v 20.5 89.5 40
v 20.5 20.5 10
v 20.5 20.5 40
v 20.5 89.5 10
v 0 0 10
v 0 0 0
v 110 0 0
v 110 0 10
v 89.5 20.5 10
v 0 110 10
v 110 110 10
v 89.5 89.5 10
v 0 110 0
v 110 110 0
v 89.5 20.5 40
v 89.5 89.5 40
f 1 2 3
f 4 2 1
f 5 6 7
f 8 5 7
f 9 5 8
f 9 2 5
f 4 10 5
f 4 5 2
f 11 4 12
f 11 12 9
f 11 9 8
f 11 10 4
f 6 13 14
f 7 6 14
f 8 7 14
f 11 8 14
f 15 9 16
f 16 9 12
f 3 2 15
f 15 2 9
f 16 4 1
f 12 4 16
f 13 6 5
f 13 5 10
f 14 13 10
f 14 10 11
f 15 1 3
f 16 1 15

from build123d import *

# Parameters (mm, degrees)
F0_W     = 110
F0_H     = 110
F0_W_2   = 69
F0_H_2   = 69
F1_DEPTH = 10
F2_DEPTH = 40


with BuildPart() as f1:
    # F0 (on Top) → F1 (new body)
    with BuildSketch(Plane.XY):
        with Locations((55, 55)):
            Rectangle(F0_W, F0_H)
        with Locations((55, 55)):
            Rectangle(F0_W_2, F0_H_2, mode=Mode.SUBTRACT)
    extrude(amount=F1_DEPTH)

    # F0 (on Top) → F2 (join)
    with BuildSketch(Plane.XY):
        with Locations((55, 55)):
            Rectangle(F0_W_2, F0_H_2)
    extrude(amount=F2_DEPTH)


solid = f1.part
